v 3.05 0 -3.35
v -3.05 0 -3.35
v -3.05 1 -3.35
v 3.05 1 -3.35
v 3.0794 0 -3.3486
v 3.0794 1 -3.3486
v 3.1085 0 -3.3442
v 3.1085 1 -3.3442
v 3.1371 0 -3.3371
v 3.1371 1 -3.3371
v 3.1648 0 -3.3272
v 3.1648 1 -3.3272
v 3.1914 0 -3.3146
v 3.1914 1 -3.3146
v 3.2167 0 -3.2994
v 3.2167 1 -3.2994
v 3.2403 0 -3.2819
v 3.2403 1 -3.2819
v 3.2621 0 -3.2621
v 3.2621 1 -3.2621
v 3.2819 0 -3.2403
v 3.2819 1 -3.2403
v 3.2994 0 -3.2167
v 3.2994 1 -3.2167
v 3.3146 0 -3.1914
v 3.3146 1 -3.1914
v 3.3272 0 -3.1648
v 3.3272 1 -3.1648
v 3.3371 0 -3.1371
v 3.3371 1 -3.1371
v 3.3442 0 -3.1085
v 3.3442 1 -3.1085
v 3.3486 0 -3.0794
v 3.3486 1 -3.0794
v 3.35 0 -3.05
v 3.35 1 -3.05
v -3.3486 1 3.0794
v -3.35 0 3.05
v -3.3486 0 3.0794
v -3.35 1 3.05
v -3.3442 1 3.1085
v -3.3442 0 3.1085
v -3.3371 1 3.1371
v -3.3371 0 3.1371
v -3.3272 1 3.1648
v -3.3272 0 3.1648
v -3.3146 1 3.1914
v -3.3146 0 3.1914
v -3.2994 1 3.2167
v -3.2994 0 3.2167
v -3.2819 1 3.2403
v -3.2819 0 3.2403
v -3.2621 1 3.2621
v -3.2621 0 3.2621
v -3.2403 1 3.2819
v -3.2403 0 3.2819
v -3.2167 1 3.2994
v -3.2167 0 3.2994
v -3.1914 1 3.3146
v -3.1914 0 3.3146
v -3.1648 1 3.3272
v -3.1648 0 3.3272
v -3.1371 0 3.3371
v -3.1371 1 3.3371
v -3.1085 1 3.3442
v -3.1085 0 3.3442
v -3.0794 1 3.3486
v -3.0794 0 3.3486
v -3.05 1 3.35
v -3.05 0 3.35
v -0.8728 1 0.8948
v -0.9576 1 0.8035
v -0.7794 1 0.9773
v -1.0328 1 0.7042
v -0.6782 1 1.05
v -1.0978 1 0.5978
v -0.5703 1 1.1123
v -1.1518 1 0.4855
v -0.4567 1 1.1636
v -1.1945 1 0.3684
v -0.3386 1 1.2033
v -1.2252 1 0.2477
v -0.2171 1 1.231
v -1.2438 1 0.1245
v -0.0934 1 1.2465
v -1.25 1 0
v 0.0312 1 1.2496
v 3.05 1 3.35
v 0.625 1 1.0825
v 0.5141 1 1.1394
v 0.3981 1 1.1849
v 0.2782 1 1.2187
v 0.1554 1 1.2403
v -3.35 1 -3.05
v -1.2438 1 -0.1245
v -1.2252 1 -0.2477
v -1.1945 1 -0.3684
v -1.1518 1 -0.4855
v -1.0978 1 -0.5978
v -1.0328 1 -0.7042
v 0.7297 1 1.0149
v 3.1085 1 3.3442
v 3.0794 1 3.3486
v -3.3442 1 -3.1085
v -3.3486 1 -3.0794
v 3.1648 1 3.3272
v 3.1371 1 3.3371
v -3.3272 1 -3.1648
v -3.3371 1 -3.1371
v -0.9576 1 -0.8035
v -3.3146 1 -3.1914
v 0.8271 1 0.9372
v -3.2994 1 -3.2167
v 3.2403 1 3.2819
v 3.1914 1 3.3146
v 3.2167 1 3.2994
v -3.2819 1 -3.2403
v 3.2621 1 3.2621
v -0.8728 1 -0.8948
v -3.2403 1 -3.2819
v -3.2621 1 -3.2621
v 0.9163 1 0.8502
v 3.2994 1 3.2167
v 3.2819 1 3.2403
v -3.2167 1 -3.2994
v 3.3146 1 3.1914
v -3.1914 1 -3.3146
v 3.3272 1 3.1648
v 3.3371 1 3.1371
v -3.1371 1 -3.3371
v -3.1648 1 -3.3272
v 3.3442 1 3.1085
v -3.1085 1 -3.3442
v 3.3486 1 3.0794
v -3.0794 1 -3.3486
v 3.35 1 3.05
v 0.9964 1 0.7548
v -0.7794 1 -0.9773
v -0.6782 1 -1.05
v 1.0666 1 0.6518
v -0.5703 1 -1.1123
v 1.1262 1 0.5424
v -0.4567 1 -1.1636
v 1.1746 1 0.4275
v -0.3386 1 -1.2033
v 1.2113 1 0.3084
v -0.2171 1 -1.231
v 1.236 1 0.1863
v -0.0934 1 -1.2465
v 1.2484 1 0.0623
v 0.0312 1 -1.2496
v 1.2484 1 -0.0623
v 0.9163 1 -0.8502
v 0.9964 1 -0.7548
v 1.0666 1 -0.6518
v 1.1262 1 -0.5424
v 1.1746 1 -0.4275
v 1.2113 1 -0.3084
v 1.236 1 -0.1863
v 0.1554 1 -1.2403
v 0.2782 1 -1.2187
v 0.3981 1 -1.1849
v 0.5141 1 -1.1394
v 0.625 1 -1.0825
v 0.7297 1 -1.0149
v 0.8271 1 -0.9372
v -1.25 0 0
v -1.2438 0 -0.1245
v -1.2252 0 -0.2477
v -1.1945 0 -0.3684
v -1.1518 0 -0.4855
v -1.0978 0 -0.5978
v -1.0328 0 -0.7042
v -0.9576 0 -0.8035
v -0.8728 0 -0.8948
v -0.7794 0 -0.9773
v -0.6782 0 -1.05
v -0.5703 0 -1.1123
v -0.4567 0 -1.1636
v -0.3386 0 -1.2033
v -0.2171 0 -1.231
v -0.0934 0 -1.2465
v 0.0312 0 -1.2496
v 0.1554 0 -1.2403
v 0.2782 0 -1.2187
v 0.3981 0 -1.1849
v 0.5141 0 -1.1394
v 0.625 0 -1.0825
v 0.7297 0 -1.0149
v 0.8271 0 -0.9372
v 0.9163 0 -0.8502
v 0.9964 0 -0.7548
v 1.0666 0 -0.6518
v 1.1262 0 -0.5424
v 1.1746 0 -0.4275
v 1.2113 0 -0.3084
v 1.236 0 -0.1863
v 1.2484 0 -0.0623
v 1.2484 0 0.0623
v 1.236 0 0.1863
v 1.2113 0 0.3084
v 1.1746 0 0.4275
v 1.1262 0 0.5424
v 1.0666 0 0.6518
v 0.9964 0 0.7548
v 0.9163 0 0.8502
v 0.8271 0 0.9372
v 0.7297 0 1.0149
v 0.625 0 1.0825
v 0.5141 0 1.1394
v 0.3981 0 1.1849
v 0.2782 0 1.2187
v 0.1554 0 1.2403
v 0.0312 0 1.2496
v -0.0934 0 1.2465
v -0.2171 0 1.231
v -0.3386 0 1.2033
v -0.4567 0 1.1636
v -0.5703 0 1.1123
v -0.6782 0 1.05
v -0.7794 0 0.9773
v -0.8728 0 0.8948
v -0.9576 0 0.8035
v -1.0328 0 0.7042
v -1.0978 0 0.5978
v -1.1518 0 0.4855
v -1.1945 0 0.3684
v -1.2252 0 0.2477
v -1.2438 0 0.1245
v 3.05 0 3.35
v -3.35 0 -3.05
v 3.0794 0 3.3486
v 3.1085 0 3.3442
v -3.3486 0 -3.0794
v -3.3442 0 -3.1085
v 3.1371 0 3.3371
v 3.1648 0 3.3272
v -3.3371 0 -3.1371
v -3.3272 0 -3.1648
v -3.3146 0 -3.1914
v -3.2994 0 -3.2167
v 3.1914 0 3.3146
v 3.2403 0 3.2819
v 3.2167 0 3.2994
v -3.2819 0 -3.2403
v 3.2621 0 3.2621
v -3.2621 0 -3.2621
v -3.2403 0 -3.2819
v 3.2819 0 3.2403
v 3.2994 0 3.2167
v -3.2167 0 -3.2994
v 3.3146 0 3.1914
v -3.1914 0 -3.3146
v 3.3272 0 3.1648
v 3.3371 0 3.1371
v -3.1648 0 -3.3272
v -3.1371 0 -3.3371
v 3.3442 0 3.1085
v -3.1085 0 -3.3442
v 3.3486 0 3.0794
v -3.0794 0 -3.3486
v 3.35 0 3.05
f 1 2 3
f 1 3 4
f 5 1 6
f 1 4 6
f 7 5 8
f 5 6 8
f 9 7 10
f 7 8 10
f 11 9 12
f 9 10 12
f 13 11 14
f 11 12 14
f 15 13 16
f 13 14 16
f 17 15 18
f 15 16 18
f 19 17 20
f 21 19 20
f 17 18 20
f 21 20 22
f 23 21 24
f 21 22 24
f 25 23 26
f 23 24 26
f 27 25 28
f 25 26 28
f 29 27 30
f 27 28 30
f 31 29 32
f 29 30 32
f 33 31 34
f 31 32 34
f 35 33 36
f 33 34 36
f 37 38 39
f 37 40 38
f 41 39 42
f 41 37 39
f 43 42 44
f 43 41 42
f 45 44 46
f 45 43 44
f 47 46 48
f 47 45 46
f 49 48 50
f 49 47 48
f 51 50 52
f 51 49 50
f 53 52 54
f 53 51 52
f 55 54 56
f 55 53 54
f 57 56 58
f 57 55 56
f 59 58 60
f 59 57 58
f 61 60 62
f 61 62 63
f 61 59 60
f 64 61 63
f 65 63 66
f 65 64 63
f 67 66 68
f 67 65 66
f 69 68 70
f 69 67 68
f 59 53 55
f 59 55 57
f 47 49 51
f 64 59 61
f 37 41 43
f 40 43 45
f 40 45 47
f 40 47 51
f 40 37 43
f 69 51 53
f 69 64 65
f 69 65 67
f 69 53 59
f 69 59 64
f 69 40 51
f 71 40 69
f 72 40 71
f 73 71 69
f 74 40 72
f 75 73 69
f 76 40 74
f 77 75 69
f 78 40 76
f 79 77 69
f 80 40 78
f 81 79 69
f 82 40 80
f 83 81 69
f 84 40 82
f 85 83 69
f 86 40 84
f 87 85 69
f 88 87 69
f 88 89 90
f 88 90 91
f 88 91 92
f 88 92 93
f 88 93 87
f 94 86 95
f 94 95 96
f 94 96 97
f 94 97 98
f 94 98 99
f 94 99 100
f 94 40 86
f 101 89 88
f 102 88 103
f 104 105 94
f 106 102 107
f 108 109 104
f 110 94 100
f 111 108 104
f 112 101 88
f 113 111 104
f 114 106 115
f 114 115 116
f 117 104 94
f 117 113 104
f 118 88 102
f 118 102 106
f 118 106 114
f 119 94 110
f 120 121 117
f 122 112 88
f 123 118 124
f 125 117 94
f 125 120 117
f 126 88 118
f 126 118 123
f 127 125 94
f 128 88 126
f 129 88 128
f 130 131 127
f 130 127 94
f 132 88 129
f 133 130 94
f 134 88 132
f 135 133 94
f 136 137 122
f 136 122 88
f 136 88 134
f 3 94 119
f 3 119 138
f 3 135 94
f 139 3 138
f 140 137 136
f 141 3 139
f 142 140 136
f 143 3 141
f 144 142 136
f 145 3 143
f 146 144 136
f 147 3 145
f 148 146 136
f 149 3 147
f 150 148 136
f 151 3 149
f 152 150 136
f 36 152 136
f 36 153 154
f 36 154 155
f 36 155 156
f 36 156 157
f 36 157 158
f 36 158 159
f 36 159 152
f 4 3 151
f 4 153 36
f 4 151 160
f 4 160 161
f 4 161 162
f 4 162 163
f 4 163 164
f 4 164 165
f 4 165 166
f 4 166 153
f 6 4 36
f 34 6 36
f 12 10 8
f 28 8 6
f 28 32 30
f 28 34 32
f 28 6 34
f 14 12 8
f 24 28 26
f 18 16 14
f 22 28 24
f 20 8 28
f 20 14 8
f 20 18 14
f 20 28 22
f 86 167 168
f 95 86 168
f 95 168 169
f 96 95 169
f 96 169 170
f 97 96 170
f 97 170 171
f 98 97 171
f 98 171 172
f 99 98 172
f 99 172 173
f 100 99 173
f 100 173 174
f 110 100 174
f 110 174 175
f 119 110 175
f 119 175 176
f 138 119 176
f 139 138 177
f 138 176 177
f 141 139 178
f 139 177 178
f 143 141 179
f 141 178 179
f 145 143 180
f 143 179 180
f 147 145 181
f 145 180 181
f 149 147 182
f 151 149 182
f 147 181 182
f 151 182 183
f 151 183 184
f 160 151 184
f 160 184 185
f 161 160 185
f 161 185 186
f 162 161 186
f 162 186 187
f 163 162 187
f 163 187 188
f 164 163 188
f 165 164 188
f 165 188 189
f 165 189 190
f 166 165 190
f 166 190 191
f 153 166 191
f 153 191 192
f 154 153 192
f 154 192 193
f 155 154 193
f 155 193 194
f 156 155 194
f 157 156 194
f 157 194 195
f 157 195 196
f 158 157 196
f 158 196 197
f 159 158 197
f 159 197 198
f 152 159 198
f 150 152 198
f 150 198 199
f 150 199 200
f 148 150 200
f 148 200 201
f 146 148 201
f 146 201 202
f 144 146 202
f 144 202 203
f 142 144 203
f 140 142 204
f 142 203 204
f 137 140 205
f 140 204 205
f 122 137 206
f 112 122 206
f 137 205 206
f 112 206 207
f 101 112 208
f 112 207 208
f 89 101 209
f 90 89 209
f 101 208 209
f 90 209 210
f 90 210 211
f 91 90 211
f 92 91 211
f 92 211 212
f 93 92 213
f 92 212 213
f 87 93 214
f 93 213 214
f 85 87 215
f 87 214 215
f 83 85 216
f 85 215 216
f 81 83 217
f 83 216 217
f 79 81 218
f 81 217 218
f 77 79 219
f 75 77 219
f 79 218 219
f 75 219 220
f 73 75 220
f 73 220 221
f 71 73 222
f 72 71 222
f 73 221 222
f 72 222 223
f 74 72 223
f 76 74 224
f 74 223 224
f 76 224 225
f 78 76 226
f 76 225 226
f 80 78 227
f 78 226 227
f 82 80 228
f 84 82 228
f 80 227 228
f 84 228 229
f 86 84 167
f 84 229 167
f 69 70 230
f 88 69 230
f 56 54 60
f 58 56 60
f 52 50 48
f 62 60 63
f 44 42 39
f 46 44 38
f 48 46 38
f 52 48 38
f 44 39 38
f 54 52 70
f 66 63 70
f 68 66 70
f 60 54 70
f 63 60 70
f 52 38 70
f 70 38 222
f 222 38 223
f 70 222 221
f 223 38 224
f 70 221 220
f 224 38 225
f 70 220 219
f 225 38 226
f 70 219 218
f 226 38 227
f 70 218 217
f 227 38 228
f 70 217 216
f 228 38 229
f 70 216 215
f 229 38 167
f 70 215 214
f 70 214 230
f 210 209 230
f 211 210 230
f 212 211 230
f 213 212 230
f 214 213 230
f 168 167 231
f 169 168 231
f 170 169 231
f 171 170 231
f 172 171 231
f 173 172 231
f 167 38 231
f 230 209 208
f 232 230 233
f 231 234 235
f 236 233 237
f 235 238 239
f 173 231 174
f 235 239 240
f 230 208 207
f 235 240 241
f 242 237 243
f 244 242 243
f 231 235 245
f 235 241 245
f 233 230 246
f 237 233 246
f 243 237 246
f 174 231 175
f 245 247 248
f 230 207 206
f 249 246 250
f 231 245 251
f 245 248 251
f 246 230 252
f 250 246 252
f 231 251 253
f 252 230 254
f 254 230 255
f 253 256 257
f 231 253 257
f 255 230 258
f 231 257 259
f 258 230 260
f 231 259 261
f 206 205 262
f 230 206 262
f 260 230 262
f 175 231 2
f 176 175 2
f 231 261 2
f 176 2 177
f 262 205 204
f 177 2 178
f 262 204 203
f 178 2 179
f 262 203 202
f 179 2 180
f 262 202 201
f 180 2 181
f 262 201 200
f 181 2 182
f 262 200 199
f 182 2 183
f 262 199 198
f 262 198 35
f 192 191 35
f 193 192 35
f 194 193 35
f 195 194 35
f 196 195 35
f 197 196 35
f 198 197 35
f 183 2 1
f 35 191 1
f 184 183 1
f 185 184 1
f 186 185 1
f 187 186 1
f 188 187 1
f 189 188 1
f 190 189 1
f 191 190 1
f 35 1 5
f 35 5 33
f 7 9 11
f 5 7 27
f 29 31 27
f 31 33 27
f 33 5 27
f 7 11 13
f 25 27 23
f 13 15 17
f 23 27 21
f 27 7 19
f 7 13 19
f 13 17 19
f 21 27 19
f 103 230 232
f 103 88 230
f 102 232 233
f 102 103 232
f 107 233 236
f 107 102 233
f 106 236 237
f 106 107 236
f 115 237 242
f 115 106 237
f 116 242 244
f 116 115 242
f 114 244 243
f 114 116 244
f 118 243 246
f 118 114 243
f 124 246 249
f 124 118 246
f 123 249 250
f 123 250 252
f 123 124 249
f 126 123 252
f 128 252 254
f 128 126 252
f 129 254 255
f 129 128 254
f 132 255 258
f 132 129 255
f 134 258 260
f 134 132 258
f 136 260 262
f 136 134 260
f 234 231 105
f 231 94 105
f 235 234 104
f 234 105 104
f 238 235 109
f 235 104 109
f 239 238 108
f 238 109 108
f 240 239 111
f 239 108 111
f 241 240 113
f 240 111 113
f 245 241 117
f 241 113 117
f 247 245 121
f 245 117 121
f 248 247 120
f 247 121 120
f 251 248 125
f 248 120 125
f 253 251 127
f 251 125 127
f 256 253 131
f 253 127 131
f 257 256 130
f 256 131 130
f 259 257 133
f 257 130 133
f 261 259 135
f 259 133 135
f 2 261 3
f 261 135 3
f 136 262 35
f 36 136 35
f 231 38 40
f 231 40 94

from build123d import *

# Parameters (mm, degrees)
SKETCH1_W             = 6.7
SKETCH1_H             = 6.7
BOSS_EXTRUDE1_DEPTH   = 1
M3X0_5_TAPPED_HOLE1_D = 2.5
FILLET1_R             = 0.3


with BuildPart() as part:
    # Sketch1 → Boss-Extrude1 (new body)
    with BuildSketch(Plane(origin=(0, 0, 0), x_dir=(1, 0, 0), z_dir=(0, 1, 0))):
        Rectangle(SKETCH1_W, SKETCH1_H)
    extrude(amount=BOSS_EXTRUDE1_DEPTH)

    # M3x0.5 Tapped Hole1 (through all)
    with Locations(Plane(origin=(0, 1, 0), x_dir=(1, 0, 0), z_dir=(0, 1, 0))):
        with Locations((0, 0)):
            Hole(M3X0_5_TAPPED_HOLE1_D / 2)

    # Fillet1
    fillet1_edges = [part.edges().sort_by_distance(p)[0] for p in [
        (3.35, 0.5, 3.35),
        (-3.35, 0.5, 3.35),
        (-3.35, 0.5, -3.35),
        (3.35, 0.5, -3.35),
    ]]
    fillet(fillet1_edges, radius=FILLET1_R)


solid = part.part
